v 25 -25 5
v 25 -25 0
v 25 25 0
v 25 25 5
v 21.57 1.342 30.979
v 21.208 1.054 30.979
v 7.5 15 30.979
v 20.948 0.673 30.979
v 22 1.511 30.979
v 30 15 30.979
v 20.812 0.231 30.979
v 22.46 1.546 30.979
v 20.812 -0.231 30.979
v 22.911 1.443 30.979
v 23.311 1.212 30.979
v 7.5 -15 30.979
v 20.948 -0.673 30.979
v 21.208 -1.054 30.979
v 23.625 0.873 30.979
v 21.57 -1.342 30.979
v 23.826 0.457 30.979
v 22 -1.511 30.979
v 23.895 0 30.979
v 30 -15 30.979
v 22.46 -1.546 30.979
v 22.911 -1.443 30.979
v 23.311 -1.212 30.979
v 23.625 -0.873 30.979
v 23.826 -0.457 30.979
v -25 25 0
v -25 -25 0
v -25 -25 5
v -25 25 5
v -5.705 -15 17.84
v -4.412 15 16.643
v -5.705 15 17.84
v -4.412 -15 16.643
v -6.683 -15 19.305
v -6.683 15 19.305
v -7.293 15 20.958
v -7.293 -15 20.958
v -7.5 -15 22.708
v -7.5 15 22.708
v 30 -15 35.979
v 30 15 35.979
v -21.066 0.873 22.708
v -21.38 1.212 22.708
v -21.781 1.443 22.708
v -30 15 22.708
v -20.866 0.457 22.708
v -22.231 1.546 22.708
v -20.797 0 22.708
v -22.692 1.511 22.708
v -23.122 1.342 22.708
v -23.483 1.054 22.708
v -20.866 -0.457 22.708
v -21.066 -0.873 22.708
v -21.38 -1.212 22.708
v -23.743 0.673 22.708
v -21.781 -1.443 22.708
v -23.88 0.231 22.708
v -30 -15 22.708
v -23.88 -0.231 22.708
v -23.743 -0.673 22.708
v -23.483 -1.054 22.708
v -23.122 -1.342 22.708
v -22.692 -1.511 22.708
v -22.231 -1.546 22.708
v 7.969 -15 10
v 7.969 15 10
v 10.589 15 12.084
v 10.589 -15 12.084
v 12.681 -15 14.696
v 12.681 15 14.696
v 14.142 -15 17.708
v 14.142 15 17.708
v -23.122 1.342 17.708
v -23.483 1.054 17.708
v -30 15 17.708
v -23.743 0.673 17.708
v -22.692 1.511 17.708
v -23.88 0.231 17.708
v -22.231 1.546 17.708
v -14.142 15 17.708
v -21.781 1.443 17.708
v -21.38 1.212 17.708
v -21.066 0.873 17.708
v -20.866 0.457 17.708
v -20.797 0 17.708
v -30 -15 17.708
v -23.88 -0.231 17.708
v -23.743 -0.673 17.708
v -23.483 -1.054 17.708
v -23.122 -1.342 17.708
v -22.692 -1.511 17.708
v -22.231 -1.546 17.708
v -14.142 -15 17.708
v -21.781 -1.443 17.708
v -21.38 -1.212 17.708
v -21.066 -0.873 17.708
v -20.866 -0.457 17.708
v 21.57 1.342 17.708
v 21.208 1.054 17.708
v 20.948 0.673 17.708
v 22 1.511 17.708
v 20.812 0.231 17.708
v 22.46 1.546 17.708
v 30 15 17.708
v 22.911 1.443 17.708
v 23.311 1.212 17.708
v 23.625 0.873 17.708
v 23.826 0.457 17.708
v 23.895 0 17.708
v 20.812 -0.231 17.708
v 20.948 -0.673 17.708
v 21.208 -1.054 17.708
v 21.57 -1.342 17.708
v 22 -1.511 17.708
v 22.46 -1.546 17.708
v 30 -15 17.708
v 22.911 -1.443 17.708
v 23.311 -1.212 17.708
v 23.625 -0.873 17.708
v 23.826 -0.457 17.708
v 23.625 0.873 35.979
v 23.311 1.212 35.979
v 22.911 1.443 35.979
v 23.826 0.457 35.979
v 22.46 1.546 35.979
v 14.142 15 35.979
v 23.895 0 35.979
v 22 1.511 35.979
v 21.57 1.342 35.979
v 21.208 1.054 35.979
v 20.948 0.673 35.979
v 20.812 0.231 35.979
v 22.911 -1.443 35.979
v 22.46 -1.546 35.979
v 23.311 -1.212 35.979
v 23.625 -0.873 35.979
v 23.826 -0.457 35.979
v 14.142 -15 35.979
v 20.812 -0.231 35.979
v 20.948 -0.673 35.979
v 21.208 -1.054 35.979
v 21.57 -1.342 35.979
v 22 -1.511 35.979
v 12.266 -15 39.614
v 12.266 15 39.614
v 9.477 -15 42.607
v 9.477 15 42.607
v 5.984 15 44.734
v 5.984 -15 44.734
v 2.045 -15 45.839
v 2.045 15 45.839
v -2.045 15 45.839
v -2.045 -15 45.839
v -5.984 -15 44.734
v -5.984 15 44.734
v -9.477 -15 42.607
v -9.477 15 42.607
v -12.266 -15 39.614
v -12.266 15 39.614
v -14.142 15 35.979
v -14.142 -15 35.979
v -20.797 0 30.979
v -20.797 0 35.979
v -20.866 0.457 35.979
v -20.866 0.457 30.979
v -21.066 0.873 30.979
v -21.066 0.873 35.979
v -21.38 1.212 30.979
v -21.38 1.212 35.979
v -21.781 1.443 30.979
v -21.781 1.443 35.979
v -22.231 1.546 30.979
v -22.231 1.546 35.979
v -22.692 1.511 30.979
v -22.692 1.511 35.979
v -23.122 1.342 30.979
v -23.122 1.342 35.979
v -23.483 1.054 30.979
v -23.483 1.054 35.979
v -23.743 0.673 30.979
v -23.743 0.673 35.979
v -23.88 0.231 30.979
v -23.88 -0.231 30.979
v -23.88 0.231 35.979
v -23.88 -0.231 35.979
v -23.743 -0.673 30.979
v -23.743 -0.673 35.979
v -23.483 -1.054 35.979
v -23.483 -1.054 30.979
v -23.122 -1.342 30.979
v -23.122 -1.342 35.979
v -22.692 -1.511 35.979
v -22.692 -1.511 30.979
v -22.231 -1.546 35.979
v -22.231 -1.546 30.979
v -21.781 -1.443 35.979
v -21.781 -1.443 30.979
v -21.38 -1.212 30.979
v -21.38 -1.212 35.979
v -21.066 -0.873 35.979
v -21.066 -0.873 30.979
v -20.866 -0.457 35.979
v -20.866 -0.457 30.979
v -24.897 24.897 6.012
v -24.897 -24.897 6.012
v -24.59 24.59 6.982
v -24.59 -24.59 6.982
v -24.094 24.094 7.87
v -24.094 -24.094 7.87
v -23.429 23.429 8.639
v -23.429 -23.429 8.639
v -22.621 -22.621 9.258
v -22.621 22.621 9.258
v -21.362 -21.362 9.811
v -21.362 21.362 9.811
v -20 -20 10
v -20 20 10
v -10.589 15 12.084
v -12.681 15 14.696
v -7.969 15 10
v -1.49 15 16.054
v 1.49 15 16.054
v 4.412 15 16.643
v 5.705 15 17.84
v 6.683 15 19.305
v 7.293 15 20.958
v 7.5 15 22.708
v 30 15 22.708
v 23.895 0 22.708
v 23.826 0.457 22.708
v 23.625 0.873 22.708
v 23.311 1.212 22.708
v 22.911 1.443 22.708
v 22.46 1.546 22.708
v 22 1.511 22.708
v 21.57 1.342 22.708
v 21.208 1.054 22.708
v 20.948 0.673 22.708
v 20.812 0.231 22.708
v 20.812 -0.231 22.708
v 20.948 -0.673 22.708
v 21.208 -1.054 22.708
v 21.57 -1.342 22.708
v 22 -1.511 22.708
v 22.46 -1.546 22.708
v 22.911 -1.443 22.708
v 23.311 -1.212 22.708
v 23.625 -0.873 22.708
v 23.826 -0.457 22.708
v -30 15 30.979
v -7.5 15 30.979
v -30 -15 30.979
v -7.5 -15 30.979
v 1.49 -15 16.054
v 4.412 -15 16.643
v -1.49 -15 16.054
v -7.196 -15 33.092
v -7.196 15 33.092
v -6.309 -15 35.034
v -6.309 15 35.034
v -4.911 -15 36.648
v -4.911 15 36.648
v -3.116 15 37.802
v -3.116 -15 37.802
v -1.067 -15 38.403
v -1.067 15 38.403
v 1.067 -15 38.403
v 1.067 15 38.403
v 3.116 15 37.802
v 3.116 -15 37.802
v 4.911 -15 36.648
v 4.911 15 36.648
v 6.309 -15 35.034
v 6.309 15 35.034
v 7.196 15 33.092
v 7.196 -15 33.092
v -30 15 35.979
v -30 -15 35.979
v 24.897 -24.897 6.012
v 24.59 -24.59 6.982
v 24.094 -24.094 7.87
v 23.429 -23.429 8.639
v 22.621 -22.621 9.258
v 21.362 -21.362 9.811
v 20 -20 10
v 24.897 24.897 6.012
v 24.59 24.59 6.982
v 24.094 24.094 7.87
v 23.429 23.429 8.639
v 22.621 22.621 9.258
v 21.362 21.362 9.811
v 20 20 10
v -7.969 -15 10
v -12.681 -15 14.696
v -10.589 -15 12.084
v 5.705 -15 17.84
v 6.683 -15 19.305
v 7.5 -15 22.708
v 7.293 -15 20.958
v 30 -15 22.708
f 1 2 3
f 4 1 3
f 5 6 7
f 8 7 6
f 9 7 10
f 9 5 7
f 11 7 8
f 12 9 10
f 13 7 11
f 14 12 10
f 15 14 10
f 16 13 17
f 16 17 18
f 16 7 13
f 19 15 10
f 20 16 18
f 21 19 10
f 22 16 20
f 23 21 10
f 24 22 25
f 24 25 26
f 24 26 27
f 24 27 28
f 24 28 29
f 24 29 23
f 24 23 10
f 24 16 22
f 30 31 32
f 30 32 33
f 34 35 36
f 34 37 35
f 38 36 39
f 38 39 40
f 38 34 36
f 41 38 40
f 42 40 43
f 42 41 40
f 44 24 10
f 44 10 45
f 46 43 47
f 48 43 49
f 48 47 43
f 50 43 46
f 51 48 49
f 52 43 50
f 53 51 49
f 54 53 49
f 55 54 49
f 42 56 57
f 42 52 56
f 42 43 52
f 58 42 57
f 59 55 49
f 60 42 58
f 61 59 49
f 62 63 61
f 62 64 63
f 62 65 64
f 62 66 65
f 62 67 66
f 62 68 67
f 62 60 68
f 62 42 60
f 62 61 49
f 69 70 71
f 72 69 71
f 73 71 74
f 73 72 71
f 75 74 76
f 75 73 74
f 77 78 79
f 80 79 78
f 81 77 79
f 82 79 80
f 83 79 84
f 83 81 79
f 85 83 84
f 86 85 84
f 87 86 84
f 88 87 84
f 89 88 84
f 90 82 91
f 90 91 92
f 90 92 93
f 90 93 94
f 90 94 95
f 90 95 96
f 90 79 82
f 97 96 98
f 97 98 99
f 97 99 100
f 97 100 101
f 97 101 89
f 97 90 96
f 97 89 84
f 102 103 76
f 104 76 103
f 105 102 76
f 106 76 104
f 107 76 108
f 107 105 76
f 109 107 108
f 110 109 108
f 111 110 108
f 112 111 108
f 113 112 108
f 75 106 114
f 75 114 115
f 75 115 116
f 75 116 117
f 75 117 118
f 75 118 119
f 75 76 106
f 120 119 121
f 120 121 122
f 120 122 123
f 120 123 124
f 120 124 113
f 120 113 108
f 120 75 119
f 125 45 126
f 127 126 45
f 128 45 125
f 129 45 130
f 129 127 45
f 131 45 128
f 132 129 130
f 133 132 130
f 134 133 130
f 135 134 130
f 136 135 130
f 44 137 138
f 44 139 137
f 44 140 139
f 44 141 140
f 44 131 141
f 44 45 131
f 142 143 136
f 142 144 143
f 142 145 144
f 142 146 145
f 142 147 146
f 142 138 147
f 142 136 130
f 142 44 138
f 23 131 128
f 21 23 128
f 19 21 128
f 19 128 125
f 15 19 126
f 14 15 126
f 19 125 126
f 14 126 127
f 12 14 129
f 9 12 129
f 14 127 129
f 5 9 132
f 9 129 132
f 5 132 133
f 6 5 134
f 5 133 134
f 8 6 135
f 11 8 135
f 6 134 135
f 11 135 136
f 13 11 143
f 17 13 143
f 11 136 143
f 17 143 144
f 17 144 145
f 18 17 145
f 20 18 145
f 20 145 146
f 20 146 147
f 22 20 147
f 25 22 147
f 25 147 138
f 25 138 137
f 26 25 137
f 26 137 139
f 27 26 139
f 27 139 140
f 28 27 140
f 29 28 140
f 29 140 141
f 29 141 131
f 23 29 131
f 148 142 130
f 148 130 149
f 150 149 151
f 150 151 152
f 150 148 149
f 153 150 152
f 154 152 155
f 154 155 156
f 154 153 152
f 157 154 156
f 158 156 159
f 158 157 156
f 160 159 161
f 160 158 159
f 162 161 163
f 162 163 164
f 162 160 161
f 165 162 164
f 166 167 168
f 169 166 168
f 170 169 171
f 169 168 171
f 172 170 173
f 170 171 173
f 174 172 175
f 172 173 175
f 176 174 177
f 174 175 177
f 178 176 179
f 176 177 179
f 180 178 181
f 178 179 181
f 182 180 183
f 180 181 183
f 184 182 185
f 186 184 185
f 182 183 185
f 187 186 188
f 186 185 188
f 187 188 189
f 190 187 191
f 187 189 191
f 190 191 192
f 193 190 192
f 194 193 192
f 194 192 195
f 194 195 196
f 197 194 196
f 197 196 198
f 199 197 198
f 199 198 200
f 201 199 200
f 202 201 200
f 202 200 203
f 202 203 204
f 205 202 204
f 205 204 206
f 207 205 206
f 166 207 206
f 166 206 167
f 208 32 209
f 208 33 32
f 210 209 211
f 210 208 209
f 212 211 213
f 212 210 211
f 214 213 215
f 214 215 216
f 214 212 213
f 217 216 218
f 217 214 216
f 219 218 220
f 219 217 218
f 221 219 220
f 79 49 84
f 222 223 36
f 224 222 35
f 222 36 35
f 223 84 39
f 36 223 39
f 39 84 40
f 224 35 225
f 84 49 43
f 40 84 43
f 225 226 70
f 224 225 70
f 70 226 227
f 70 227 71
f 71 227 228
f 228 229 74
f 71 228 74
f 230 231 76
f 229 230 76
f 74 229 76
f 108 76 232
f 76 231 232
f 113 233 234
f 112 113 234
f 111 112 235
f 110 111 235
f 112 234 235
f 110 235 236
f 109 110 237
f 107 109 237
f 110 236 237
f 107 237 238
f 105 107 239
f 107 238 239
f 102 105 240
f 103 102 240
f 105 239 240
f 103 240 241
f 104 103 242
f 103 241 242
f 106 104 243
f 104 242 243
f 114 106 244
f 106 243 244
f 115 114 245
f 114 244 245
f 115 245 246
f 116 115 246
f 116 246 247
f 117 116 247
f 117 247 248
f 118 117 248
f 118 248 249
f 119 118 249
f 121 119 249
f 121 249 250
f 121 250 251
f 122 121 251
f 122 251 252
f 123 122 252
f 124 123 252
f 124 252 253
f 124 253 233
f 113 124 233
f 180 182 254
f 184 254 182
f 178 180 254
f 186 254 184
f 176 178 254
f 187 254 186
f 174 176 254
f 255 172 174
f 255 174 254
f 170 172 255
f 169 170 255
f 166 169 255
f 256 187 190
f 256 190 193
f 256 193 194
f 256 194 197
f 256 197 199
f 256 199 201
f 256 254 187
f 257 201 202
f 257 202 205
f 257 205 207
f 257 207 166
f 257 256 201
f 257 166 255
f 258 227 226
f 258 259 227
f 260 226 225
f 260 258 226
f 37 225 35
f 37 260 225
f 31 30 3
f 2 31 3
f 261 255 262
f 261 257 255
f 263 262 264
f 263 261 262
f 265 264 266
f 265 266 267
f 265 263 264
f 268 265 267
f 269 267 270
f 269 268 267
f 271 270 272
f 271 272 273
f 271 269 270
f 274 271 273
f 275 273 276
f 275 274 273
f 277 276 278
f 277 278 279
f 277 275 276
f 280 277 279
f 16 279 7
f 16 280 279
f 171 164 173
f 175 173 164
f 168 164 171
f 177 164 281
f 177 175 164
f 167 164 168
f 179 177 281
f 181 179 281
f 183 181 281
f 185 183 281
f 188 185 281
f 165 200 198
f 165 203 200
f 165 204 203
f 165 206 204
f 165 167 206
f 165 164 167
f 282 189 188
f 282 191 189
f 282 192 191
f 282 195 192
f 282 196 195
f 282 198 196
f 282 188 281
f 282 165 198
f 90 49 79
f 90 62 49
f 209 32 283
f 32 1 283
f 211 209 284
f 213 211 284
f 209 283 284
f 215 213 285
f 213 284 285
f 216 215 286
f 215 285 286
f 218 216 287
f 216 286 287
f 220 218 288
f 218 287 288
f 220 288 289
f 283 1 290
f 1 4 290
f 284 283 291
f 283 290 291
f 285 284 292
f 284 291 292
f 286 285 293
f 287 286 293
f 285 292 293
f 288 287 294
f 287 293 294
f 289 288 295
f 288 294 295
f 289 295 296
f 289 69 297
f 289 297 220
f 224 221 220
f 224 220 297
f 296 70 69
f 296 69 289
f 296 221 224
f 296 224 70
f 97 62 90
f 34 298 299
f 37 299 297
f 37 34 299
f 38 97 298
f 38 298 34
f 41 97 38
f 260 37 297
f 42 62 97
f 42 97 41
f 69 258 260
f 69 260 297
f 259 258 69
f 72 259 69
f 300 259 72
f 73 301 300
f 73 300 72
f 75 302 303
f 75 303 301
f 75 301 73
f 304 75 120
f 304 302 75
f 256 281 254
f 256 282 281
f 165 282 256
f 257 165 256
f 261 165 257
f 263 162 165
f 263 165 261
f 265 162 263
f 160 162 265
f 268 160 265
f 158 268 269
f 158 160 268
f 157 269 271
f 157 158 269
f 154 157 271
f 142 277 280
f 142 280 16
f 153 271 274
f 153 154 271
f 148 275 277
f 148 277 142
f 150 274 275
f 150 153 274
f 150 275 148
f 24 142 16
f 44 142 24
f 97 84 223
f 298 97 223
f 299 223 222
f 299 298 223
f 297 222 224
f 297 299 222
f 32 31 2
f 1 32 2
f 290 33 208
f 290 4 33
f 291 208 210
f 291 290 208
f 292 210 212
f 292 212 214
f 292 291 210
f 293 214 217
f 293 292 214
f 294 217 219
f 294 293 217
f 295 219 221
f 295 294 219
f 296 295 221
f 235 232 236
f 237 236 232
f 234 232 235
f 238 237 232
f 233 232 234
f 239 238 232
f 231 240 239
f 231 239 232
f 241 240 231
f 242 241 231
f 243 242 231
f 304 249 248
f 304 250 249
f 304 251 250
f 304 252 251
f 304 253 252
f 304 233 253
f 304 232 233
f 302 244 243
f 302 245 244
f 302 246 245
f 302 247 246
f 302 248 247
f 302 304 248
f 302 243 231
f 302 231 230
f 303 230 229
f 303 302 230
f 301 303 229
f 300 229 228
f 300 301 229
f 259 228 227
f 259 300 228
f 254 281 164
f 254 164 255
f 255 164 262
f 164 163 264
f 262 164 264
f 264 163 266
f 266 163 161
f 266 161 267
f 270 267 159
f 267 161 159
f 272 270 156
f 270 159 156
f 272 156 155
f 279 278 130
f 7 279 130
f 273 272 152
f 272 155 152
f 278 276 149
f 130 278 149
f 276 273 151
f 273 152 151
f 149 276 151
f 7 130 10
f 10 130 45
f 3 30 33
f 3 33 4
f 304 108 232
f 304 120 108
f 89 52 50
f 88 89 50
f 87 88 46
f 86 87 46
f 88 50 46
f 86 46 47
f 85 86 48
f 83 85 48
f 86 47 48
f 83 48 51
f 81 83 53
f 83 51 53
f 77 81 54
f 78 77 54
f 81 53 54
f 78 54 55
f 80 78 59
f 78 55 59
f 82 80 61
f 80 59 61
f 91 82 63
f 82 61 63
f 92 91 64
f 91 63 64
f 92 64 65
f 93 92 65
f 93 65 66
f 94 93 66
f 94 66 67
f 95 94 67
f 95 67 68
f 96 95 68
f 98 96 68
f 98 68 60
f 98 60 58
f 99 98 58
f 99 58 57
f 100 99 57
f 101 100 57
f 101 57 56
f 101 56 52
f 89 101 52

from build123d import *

# Parameters (mm, degrees)
F0_W          = 50
F0_H          = 50
F1_DEPTH      = 10
F2_R          = 5
F4_DEPTH      = 15
F4_DEPTH_BACK = 15
F5_R          = 1.55
F6_DEPTH      = 25


with BuildPart() as f1:
    # F0 (on Top) → F1 (new body)
    with BuildSketch(Plane.XY):
        Rectangle(F0_W, F0_H)
    extrude(amount=F1_DEPTH)

    # F2
    f2_edges = [f1.edges().sort_by_distance(p)[0] for p in [
        (0, -25, 10),
        (-25, 0, 10),
        (25, 0, 10),
        (0, 25, 10),
    ]]
    fillet(f2_edges, radius=F2_R)

    # F3 (on Front) → F4 (join, two sides)
    with BuildSketch(Plane.XZ) as f4_sk:
        with BuildLine():
            ThreePointArc((-7.5, 30.979477), (0, 38.479477), (7.5, 30.979477))
            Line((7.5, 30.979477), (14.142136, 30.979477))
            Line((14.142136, 30.979477), (15, 30.979477))
            Line((15, 30.979477), (30, 30.979477))
            Line((30, 30.979477), (30, 35.979477))
            Line((30, 35.979477), (14.142136, 35.979477))
            ThreePointArc((14.142136, 35.979477), (0, 45.979477), (-14.142136, 35.979477))
            Line((-14.142136, 35.979477), (-30, 35.979477))
            Line((-30, 35.979477), (-30, 30.979477))
            Line((-30, 30.979477), (-15, 30.979477))
            Line((-15, 30.979477), (-14.142136, 30.979477))
            Line((-14.142136, 30.979477), (-7.5, 30.979477))
        make_face()
        with BuildLine():
            Line((-30, 17.708183), (-14.142136, 17.708183))
            ThreePointArc((-14.142136, 17.708183), (0, 7.708183), (14.142136, 17.708183))
            Line((14.142136, 17.708183), (30, 17.708183))
            Line((30, 17.708183), (30, 22.708183))
            Line((30, 22.708183), (15, 22.708183))
            Line((15, 22.708183), (14.142136, 22.708183))
            Line((14.142136, 22.708183), (7.5, 22.708183))
            ThreePointArc((7.5, 22.708183), (6.683448, 19.30502), (4.411596, 16.642886))
            ThreePointArc((4.411596, 16.642886), (0, 15.979477), (-4.411596, 16.642886))
            ThreePointArc((-4.411596, 16.642886), (-6.683448, 19.30502), (-7.5, 22.708183))
            Line((-7.5, 22.708183), (-14.142136, 22.708183))
            Line((-14.142136, 22.708183), (-15, 22.708183))
            Line((-15, 22.708183), (-30, 22.708183))
            Line((-30, 22.708183), (-30, 17.708183))
        make_face()
    extrude(amount=F4_DEPTH)
    extrude(f4_sk.sketch, amount=-F4_DEPTH_BACK)

    # F5 (on face) → F6 (cut)
    with BuildSketch(Plane.XY.offset(35.979477)):
        with Locations((-22.34684, 0)):
            Circle(F5_R)
        with Locations((22.344638, 0)):
            Circle(F5_R)
    extrude(amount=-F6_DEPTH, mode=Mode.SUBTRACT)


solid = f1.part
